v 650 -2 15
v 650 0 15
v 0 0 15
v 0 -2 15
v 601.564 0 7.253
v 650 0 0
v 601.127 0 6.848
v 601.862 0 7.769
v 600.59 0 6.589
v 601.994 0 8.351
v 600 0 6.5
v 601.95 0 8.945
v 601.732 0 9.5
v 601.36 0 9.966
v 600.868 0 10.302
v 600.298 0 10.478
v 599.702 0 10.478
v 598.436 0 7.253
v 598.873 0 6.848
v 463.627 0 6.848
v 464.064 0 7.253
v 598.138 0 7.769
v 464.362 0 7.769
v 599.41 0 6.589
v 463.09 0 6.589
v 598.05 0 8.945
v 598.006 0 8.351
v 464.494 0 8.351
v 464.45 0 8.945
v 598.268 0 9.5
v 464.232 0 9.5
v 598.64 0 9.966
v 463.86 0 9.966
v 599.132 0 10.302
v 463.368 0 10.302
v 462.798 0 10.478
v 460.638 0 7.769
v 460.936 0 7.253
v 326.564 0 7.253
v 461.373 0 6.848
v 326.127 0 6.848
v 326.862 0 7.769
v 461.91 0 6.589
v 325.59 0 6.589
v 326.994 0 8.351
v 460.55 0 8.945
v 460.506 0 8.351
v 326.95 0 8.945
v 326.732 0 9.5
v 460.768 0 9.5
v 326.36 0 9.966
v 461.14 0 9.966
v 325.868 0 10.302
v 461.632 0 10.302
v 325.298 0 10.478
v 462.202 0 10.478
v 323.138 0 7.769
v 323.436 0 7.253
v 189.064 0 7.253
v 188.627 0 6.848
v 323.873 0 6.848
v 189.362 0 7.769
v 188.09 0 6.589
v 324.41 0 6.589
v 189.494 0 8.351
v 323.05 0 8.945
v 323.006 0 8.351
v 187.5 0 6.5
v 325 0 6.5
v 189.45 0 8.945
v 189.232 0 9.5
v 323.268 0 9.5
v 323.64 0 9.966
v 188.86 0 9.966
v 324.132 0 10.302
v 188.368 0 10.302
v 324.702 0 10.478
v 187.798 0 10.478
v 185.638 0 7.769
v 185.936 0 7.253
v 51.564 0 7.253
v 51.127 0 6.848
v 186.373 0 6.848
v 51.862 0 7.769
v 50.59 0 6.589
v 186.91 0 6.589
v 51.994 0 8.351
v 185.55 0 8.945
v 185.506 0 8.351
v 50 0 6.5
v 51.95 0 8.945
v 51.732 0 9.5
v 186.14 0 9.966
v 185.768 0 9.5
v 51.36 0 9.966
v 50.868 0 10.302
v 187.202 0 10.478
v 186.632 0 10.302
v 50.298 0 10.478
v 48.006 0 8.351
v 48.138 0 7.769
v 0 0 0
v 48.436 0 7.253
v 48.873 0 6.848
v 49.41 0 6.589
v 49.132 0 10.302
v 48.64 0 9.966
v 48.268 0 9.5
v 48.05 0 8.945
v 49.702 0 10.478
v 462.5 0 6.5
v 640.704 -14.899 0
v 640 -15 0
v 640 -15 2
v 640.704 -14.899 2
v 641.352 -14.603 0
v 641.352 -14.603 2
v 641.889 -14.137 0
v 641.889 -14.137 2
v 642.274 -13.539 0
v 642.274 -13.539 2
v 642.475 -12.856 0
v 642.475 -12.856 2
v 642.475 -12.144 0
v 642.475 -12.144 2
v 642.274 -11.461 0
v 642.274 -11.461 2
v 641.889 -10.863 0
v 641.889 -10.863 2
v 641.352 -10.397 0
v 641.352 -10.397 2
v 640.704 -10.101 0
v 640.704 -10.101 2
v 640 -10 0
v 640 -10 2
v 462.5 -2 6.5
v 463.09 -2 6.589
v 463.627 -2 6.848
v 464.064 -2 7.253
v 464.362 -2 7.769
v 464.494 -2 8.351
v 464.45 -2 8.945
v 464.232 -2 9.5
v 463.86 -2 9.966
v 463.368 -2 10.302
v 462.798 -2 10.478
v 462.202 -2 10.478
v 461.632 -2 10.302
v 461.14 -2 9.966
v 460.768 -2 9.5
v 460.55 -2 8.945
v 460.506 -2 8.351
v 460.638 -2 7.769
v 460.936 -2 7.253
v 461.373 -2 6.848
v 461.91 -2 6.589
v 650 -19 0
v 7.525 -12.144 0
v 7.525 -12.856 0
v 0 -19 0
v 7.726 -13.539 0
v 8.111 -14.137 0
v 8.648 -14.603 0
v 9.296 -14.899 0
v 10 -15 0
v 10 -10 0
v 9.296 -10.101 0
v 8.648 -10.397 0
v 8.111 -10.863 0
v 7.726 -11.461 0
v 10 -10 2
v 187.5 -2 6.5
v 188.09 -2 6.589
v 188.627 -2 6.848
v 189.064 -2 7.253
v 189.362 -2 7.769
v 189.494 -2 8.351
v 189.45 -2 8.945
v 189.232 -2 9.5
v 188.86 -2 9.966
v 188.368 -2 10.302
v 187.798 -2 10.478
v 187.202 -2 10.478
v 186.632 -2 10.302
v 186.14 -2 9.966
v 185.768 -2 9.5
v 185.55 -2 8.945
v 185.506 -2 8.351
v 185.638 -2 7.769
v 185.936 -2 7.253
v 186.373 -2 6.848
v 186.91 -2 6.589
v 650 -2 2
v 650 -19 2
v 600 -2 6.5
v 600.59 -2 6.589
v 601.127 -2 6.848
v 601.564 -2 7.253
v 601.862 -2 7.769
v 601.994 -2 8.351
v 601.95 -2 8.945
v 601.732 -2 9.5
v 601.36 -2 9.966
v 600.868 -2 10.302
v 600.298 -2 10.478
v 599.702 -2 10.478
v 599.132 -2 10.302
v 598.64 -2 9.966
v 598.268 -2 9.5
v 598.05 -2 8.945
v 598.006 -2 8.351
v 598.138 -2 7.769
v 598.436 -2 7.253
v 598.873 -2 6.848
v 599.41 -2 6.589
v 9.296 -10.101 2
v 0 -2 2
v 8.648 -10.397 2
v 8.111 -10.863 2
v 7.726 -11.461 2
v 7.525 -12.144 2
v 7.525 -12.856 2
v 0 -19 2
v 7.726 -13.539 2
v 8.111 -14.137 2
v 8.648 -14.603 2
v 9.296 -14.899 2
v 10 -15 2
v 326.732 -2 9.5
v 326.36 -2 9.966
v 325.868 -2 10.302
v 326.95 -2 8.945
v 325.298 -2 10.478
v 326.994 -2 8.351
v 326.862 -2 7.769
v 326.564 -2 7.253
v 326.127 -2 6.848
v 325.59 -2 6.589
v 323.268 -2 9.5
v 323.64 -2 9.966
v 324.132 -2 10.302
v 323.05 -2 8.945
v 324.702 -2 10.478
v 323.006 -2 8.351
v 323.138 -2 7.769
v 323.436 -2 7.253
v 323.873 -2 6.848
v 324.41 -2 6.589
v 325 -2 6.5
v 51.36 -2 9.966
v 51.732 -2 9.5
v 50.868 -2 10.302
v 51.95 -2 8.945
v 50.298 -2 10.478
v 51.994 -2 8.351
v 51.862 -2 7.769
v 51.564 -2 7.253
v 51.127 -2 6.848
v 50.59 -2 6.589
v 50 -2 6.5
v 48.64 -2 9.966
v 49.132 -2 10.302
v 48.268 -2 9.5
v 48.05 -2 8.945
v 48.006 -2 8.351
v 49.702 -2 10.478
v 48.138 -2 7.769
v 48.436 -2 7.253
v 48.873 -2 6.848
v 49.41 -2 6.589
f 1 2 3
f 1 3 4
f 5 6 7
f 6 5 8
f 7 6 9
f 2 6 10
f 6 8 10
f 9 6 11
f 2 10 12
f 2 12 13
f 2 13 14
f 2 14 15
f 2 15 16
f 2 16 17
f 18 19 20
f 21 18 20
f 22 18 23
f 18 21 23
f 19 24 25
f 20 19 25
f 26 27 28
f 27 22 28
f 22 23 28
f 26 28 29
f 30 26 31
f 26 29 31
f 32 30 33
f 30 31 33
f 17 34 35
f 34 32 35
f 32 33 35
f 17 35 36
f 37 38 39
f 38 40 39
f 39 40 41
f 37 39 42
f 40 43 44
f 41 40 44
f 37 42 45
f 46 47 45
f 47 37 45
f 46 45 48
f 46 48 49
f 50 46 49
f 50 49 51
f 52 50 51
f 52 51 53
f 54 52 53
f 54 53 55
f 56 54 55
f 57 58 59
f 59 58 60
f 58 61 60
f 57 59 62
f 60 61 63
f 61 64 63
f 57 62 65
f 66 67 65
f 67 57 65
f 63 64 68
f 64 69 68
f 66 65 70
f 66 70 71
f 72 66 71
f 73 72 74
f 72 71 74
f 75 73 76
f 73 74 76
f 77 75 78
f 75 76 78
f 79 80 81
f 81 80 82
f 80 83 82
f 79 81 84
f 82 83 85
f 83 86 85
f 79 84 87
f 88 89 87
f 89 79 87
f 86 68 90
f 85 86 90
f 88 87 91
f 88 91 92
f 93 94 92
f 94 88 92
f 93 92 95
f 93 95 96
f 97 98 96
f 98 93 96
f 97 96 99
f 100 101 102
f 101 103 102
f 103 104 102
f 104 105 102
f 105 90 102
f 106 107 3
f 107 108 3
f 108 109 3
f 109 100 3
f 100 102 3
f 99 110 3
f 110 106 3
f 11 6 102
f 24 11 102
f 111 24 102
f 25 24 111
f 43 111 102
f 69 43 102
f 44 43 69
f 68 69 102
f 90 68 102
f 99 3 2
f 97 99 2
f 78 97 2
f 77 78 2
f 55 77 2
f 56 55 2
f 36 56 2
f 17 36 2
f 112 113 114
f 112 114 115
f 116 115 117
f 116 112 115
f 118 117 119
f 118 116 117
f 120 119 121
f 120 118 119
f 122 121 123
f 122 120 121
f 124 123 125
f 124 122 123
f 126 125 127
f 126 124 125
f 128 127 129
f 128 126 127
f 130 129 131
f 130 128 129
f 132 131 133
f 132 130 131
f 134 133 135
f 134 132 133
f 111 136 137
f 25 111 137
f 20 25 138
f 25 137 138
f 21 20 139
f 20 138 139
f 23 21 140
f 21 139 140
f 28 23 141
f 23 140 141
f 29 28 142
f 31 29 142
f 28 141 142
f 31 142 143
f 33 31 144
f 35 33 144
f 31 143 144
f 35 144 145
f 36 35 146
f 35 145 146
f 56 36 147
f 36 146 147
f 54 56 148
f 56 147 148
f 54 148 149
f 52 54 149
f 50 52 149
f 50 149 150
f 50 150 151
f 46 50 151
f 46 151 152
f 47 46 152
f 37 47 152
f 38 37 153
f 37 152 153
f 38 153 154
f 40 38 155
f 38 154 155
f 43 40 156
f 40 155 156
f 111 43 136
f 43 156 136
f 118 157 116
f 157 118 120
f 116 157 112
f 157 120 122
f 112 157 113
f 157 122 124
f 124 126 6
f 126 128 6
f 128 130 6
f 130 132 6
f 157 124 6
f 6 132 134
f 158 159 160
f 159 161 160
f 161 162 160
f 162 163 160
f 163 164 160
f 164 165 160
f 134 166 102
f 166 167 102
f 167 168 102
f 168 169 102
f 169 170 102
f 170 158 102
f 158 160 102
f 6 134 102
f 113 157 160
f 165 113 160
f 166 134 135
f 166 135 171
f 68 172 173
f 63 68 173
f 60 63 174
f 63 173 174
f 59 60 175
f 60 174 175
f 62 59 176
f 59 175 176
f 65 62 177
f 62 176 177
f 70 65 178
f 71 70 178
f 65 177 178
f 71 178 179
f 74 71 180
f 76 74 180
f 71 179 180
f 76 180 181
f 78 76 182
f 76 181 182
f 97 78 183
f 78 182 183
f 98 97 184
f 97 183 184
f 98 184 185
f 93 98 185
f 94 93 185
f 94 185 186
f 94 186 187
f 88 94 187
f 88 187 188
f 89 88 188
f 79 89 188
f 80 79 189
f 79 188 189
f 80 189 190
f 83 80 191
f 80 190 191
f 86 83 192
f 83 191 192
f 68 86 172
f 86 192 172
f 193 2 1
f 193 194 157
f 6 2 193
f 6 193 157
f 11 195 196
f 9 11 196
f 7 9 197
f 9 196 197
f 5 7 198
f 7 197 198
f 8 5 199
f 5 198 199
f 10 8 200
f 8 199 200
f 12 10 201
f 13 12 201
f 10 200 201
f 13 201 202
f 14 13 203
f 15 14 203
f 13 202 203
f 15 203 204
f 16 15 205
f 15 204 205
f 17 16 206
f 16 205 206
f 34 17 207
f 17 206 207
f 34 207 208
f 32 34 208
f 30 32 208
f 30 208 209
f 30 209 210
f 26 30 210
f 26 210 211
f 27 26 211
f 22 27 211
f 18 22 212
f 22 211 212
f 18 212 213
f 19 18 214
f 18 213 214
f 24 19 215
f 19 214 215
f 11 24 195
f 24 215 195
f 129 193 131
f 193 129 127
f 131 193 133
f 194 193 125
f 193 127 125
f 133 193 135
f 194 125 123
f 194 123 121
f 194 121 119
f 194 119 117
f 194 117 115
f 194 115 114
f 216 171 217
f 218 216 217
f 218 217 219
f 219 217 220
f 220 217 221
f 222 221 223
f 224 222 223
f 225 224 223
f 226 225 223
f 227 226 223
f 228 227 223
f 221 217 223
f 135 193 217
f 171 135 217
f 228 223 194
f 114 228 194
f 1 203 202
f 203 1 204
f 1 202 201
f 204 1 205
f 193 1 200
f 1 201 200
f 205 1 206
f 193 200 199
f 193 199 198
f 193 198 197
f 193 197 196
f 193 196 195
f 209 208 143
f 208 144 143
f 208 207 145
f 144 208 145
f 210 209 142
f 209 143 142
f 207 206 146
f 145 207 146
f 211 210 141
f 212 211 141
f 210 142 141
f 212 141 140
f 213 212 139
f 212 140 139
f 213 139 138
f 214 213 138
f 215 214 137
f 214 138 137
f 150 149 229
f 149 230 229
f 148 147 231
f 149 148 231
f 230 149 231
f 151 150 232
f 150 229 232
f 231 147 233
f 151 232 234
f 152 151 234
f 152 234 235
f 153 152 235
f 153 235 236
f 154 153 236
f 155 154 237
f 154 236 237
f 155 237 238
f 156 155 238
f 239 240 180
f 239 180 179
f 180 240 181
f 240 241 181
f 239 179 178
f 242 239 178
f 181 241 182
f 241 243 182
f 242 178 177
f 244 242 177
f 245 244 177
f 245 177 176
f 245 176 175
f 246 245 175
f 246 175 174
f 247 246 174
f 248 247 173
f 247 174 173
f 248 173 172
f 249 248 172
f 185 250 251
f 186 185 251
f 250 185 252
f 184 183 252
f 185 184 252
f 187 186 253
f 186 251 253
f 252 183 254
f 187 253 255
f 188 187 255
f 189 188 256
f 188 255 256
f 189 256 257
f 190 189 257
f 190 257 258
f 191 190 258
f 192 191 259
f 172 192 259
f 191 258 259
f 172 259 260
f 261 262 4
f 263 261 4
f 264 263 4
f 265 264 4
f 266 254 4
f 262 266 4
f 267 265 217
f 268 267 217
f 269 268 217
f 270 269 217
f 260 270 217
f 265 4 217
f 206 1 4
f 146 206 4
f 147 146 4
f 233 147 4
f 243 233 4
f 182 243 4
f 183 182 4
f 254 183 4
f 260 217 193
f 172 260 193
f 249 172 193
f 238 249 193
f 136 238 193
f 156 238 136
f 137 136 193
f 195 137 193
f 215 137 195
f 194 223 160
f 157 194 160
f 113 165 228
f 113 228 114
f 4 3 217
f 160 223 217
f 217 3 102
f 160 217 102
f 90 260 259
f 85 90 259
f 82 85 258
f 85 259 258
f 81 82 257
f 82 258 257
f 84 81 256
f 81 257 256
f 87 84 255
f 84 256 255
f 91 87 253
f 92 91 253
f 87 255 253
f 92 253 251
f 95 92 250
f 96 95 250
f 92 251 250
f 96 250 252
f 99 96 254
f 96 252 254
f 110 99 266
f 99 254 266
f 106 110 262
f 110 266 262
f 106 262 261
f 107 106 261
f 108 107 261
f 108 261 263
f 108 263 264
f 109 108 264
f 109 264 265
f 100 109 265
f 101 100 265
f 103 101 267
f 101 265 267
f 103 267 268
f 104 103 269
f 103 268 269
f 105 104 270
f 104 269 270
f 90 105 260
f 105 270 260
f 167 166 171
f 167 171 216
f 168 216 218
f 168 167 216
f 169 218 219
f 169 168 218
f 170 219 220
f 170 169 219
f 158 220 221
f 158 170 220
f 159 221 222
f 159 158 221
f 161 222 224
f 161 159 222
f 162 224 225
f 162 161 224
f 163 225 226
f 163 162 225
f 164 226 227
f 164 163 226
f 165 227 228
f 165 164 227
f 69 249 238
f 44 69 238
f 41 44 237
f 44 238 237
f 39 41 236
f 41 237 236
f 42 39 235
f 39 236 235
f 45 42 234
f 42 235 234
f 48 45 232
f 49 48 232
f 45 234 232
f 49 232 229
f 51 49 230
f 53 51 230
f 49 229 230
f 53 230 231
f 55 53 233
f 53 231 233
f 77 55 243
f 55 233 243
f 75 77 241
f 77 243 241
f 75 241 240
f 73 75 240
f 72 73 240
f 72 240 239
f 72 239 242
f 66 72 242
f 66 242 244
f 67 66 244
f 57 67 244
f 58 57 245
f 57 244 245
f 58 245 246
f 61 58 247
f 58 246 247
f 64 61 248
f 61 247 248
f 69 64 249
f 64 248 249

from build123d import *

# Parameters (mm, degrees)
BOSS_EXTRUDE1_DEPTH = 650
CUT_EXTRUDE1_DEPTH  = 2
SKETCH4_R           = 2
CUT_EXTRUDE2_DEPTH  = 2


with BuildPart() as part:
    # Sketch1 → Boss-Extrude1 (new body)
    with BuildSketch(Plane(origin=(0, 0, 0), x_dir=(0, 0, -1), z_dir=(1, 0, 0))):
        Polygon((0, 0), (-15, 0), (-15, -2), (-2, -2), (-2, -19), (0, -19), align=None)
    extrude(amount=BOSS_EXTRUDE1_DEPTH)

    # Sketch3 → Cut-Extrude1 (cut)
    with BuildSketch(Plane(origin=(0, 0, 0), x_dir=(-1, 0, 0), z_dir=(0, 0, -1))):
        with BuildLine():
            Line((-640, -10), (-10, -10))
            ThreePointArc((-10, -10), (-7.5, -12.5), (-10, -15))
            Line((-10, -15), (-640, -15))
            ThreePointArc((-640, -15), (-642.5, -12.5), (-640, -10))
        make_face()
    extrude(amount=-CUT_EXTRUDE1_DEPTH, mode=Mode.SUBTRACT)

    # Sketch4 → Cut-Extrude2 (cut)
    with BuildSketch(Plane.XZ.offset(2)):
        with Locations(Location((325, 8.5, 0), (0, 0, 270))):
            Circle(SKETCH4_R)
        with Locations(Location((187.5, 8.5, 0), (0, 0, 270))):
            Circle(SKETCH4_R)
        with Locations(Location((50, 8.5, 0), (0, 0, 270))):
            Circle(SKETCH4_R)
        with Locations(Location((462.5, 8.5, 0), (0, 0, 270))):
            Circle(SKETCH4_R)
        with Locations(Location((600, 8.5, 0), (0, 0, 270))):
            Circle(SKETCH4_R)
    extrude(amount=-CUT_EXTRUDE2_DEPTH, mode=Mode.SUBTRACT)


solid = part.part
